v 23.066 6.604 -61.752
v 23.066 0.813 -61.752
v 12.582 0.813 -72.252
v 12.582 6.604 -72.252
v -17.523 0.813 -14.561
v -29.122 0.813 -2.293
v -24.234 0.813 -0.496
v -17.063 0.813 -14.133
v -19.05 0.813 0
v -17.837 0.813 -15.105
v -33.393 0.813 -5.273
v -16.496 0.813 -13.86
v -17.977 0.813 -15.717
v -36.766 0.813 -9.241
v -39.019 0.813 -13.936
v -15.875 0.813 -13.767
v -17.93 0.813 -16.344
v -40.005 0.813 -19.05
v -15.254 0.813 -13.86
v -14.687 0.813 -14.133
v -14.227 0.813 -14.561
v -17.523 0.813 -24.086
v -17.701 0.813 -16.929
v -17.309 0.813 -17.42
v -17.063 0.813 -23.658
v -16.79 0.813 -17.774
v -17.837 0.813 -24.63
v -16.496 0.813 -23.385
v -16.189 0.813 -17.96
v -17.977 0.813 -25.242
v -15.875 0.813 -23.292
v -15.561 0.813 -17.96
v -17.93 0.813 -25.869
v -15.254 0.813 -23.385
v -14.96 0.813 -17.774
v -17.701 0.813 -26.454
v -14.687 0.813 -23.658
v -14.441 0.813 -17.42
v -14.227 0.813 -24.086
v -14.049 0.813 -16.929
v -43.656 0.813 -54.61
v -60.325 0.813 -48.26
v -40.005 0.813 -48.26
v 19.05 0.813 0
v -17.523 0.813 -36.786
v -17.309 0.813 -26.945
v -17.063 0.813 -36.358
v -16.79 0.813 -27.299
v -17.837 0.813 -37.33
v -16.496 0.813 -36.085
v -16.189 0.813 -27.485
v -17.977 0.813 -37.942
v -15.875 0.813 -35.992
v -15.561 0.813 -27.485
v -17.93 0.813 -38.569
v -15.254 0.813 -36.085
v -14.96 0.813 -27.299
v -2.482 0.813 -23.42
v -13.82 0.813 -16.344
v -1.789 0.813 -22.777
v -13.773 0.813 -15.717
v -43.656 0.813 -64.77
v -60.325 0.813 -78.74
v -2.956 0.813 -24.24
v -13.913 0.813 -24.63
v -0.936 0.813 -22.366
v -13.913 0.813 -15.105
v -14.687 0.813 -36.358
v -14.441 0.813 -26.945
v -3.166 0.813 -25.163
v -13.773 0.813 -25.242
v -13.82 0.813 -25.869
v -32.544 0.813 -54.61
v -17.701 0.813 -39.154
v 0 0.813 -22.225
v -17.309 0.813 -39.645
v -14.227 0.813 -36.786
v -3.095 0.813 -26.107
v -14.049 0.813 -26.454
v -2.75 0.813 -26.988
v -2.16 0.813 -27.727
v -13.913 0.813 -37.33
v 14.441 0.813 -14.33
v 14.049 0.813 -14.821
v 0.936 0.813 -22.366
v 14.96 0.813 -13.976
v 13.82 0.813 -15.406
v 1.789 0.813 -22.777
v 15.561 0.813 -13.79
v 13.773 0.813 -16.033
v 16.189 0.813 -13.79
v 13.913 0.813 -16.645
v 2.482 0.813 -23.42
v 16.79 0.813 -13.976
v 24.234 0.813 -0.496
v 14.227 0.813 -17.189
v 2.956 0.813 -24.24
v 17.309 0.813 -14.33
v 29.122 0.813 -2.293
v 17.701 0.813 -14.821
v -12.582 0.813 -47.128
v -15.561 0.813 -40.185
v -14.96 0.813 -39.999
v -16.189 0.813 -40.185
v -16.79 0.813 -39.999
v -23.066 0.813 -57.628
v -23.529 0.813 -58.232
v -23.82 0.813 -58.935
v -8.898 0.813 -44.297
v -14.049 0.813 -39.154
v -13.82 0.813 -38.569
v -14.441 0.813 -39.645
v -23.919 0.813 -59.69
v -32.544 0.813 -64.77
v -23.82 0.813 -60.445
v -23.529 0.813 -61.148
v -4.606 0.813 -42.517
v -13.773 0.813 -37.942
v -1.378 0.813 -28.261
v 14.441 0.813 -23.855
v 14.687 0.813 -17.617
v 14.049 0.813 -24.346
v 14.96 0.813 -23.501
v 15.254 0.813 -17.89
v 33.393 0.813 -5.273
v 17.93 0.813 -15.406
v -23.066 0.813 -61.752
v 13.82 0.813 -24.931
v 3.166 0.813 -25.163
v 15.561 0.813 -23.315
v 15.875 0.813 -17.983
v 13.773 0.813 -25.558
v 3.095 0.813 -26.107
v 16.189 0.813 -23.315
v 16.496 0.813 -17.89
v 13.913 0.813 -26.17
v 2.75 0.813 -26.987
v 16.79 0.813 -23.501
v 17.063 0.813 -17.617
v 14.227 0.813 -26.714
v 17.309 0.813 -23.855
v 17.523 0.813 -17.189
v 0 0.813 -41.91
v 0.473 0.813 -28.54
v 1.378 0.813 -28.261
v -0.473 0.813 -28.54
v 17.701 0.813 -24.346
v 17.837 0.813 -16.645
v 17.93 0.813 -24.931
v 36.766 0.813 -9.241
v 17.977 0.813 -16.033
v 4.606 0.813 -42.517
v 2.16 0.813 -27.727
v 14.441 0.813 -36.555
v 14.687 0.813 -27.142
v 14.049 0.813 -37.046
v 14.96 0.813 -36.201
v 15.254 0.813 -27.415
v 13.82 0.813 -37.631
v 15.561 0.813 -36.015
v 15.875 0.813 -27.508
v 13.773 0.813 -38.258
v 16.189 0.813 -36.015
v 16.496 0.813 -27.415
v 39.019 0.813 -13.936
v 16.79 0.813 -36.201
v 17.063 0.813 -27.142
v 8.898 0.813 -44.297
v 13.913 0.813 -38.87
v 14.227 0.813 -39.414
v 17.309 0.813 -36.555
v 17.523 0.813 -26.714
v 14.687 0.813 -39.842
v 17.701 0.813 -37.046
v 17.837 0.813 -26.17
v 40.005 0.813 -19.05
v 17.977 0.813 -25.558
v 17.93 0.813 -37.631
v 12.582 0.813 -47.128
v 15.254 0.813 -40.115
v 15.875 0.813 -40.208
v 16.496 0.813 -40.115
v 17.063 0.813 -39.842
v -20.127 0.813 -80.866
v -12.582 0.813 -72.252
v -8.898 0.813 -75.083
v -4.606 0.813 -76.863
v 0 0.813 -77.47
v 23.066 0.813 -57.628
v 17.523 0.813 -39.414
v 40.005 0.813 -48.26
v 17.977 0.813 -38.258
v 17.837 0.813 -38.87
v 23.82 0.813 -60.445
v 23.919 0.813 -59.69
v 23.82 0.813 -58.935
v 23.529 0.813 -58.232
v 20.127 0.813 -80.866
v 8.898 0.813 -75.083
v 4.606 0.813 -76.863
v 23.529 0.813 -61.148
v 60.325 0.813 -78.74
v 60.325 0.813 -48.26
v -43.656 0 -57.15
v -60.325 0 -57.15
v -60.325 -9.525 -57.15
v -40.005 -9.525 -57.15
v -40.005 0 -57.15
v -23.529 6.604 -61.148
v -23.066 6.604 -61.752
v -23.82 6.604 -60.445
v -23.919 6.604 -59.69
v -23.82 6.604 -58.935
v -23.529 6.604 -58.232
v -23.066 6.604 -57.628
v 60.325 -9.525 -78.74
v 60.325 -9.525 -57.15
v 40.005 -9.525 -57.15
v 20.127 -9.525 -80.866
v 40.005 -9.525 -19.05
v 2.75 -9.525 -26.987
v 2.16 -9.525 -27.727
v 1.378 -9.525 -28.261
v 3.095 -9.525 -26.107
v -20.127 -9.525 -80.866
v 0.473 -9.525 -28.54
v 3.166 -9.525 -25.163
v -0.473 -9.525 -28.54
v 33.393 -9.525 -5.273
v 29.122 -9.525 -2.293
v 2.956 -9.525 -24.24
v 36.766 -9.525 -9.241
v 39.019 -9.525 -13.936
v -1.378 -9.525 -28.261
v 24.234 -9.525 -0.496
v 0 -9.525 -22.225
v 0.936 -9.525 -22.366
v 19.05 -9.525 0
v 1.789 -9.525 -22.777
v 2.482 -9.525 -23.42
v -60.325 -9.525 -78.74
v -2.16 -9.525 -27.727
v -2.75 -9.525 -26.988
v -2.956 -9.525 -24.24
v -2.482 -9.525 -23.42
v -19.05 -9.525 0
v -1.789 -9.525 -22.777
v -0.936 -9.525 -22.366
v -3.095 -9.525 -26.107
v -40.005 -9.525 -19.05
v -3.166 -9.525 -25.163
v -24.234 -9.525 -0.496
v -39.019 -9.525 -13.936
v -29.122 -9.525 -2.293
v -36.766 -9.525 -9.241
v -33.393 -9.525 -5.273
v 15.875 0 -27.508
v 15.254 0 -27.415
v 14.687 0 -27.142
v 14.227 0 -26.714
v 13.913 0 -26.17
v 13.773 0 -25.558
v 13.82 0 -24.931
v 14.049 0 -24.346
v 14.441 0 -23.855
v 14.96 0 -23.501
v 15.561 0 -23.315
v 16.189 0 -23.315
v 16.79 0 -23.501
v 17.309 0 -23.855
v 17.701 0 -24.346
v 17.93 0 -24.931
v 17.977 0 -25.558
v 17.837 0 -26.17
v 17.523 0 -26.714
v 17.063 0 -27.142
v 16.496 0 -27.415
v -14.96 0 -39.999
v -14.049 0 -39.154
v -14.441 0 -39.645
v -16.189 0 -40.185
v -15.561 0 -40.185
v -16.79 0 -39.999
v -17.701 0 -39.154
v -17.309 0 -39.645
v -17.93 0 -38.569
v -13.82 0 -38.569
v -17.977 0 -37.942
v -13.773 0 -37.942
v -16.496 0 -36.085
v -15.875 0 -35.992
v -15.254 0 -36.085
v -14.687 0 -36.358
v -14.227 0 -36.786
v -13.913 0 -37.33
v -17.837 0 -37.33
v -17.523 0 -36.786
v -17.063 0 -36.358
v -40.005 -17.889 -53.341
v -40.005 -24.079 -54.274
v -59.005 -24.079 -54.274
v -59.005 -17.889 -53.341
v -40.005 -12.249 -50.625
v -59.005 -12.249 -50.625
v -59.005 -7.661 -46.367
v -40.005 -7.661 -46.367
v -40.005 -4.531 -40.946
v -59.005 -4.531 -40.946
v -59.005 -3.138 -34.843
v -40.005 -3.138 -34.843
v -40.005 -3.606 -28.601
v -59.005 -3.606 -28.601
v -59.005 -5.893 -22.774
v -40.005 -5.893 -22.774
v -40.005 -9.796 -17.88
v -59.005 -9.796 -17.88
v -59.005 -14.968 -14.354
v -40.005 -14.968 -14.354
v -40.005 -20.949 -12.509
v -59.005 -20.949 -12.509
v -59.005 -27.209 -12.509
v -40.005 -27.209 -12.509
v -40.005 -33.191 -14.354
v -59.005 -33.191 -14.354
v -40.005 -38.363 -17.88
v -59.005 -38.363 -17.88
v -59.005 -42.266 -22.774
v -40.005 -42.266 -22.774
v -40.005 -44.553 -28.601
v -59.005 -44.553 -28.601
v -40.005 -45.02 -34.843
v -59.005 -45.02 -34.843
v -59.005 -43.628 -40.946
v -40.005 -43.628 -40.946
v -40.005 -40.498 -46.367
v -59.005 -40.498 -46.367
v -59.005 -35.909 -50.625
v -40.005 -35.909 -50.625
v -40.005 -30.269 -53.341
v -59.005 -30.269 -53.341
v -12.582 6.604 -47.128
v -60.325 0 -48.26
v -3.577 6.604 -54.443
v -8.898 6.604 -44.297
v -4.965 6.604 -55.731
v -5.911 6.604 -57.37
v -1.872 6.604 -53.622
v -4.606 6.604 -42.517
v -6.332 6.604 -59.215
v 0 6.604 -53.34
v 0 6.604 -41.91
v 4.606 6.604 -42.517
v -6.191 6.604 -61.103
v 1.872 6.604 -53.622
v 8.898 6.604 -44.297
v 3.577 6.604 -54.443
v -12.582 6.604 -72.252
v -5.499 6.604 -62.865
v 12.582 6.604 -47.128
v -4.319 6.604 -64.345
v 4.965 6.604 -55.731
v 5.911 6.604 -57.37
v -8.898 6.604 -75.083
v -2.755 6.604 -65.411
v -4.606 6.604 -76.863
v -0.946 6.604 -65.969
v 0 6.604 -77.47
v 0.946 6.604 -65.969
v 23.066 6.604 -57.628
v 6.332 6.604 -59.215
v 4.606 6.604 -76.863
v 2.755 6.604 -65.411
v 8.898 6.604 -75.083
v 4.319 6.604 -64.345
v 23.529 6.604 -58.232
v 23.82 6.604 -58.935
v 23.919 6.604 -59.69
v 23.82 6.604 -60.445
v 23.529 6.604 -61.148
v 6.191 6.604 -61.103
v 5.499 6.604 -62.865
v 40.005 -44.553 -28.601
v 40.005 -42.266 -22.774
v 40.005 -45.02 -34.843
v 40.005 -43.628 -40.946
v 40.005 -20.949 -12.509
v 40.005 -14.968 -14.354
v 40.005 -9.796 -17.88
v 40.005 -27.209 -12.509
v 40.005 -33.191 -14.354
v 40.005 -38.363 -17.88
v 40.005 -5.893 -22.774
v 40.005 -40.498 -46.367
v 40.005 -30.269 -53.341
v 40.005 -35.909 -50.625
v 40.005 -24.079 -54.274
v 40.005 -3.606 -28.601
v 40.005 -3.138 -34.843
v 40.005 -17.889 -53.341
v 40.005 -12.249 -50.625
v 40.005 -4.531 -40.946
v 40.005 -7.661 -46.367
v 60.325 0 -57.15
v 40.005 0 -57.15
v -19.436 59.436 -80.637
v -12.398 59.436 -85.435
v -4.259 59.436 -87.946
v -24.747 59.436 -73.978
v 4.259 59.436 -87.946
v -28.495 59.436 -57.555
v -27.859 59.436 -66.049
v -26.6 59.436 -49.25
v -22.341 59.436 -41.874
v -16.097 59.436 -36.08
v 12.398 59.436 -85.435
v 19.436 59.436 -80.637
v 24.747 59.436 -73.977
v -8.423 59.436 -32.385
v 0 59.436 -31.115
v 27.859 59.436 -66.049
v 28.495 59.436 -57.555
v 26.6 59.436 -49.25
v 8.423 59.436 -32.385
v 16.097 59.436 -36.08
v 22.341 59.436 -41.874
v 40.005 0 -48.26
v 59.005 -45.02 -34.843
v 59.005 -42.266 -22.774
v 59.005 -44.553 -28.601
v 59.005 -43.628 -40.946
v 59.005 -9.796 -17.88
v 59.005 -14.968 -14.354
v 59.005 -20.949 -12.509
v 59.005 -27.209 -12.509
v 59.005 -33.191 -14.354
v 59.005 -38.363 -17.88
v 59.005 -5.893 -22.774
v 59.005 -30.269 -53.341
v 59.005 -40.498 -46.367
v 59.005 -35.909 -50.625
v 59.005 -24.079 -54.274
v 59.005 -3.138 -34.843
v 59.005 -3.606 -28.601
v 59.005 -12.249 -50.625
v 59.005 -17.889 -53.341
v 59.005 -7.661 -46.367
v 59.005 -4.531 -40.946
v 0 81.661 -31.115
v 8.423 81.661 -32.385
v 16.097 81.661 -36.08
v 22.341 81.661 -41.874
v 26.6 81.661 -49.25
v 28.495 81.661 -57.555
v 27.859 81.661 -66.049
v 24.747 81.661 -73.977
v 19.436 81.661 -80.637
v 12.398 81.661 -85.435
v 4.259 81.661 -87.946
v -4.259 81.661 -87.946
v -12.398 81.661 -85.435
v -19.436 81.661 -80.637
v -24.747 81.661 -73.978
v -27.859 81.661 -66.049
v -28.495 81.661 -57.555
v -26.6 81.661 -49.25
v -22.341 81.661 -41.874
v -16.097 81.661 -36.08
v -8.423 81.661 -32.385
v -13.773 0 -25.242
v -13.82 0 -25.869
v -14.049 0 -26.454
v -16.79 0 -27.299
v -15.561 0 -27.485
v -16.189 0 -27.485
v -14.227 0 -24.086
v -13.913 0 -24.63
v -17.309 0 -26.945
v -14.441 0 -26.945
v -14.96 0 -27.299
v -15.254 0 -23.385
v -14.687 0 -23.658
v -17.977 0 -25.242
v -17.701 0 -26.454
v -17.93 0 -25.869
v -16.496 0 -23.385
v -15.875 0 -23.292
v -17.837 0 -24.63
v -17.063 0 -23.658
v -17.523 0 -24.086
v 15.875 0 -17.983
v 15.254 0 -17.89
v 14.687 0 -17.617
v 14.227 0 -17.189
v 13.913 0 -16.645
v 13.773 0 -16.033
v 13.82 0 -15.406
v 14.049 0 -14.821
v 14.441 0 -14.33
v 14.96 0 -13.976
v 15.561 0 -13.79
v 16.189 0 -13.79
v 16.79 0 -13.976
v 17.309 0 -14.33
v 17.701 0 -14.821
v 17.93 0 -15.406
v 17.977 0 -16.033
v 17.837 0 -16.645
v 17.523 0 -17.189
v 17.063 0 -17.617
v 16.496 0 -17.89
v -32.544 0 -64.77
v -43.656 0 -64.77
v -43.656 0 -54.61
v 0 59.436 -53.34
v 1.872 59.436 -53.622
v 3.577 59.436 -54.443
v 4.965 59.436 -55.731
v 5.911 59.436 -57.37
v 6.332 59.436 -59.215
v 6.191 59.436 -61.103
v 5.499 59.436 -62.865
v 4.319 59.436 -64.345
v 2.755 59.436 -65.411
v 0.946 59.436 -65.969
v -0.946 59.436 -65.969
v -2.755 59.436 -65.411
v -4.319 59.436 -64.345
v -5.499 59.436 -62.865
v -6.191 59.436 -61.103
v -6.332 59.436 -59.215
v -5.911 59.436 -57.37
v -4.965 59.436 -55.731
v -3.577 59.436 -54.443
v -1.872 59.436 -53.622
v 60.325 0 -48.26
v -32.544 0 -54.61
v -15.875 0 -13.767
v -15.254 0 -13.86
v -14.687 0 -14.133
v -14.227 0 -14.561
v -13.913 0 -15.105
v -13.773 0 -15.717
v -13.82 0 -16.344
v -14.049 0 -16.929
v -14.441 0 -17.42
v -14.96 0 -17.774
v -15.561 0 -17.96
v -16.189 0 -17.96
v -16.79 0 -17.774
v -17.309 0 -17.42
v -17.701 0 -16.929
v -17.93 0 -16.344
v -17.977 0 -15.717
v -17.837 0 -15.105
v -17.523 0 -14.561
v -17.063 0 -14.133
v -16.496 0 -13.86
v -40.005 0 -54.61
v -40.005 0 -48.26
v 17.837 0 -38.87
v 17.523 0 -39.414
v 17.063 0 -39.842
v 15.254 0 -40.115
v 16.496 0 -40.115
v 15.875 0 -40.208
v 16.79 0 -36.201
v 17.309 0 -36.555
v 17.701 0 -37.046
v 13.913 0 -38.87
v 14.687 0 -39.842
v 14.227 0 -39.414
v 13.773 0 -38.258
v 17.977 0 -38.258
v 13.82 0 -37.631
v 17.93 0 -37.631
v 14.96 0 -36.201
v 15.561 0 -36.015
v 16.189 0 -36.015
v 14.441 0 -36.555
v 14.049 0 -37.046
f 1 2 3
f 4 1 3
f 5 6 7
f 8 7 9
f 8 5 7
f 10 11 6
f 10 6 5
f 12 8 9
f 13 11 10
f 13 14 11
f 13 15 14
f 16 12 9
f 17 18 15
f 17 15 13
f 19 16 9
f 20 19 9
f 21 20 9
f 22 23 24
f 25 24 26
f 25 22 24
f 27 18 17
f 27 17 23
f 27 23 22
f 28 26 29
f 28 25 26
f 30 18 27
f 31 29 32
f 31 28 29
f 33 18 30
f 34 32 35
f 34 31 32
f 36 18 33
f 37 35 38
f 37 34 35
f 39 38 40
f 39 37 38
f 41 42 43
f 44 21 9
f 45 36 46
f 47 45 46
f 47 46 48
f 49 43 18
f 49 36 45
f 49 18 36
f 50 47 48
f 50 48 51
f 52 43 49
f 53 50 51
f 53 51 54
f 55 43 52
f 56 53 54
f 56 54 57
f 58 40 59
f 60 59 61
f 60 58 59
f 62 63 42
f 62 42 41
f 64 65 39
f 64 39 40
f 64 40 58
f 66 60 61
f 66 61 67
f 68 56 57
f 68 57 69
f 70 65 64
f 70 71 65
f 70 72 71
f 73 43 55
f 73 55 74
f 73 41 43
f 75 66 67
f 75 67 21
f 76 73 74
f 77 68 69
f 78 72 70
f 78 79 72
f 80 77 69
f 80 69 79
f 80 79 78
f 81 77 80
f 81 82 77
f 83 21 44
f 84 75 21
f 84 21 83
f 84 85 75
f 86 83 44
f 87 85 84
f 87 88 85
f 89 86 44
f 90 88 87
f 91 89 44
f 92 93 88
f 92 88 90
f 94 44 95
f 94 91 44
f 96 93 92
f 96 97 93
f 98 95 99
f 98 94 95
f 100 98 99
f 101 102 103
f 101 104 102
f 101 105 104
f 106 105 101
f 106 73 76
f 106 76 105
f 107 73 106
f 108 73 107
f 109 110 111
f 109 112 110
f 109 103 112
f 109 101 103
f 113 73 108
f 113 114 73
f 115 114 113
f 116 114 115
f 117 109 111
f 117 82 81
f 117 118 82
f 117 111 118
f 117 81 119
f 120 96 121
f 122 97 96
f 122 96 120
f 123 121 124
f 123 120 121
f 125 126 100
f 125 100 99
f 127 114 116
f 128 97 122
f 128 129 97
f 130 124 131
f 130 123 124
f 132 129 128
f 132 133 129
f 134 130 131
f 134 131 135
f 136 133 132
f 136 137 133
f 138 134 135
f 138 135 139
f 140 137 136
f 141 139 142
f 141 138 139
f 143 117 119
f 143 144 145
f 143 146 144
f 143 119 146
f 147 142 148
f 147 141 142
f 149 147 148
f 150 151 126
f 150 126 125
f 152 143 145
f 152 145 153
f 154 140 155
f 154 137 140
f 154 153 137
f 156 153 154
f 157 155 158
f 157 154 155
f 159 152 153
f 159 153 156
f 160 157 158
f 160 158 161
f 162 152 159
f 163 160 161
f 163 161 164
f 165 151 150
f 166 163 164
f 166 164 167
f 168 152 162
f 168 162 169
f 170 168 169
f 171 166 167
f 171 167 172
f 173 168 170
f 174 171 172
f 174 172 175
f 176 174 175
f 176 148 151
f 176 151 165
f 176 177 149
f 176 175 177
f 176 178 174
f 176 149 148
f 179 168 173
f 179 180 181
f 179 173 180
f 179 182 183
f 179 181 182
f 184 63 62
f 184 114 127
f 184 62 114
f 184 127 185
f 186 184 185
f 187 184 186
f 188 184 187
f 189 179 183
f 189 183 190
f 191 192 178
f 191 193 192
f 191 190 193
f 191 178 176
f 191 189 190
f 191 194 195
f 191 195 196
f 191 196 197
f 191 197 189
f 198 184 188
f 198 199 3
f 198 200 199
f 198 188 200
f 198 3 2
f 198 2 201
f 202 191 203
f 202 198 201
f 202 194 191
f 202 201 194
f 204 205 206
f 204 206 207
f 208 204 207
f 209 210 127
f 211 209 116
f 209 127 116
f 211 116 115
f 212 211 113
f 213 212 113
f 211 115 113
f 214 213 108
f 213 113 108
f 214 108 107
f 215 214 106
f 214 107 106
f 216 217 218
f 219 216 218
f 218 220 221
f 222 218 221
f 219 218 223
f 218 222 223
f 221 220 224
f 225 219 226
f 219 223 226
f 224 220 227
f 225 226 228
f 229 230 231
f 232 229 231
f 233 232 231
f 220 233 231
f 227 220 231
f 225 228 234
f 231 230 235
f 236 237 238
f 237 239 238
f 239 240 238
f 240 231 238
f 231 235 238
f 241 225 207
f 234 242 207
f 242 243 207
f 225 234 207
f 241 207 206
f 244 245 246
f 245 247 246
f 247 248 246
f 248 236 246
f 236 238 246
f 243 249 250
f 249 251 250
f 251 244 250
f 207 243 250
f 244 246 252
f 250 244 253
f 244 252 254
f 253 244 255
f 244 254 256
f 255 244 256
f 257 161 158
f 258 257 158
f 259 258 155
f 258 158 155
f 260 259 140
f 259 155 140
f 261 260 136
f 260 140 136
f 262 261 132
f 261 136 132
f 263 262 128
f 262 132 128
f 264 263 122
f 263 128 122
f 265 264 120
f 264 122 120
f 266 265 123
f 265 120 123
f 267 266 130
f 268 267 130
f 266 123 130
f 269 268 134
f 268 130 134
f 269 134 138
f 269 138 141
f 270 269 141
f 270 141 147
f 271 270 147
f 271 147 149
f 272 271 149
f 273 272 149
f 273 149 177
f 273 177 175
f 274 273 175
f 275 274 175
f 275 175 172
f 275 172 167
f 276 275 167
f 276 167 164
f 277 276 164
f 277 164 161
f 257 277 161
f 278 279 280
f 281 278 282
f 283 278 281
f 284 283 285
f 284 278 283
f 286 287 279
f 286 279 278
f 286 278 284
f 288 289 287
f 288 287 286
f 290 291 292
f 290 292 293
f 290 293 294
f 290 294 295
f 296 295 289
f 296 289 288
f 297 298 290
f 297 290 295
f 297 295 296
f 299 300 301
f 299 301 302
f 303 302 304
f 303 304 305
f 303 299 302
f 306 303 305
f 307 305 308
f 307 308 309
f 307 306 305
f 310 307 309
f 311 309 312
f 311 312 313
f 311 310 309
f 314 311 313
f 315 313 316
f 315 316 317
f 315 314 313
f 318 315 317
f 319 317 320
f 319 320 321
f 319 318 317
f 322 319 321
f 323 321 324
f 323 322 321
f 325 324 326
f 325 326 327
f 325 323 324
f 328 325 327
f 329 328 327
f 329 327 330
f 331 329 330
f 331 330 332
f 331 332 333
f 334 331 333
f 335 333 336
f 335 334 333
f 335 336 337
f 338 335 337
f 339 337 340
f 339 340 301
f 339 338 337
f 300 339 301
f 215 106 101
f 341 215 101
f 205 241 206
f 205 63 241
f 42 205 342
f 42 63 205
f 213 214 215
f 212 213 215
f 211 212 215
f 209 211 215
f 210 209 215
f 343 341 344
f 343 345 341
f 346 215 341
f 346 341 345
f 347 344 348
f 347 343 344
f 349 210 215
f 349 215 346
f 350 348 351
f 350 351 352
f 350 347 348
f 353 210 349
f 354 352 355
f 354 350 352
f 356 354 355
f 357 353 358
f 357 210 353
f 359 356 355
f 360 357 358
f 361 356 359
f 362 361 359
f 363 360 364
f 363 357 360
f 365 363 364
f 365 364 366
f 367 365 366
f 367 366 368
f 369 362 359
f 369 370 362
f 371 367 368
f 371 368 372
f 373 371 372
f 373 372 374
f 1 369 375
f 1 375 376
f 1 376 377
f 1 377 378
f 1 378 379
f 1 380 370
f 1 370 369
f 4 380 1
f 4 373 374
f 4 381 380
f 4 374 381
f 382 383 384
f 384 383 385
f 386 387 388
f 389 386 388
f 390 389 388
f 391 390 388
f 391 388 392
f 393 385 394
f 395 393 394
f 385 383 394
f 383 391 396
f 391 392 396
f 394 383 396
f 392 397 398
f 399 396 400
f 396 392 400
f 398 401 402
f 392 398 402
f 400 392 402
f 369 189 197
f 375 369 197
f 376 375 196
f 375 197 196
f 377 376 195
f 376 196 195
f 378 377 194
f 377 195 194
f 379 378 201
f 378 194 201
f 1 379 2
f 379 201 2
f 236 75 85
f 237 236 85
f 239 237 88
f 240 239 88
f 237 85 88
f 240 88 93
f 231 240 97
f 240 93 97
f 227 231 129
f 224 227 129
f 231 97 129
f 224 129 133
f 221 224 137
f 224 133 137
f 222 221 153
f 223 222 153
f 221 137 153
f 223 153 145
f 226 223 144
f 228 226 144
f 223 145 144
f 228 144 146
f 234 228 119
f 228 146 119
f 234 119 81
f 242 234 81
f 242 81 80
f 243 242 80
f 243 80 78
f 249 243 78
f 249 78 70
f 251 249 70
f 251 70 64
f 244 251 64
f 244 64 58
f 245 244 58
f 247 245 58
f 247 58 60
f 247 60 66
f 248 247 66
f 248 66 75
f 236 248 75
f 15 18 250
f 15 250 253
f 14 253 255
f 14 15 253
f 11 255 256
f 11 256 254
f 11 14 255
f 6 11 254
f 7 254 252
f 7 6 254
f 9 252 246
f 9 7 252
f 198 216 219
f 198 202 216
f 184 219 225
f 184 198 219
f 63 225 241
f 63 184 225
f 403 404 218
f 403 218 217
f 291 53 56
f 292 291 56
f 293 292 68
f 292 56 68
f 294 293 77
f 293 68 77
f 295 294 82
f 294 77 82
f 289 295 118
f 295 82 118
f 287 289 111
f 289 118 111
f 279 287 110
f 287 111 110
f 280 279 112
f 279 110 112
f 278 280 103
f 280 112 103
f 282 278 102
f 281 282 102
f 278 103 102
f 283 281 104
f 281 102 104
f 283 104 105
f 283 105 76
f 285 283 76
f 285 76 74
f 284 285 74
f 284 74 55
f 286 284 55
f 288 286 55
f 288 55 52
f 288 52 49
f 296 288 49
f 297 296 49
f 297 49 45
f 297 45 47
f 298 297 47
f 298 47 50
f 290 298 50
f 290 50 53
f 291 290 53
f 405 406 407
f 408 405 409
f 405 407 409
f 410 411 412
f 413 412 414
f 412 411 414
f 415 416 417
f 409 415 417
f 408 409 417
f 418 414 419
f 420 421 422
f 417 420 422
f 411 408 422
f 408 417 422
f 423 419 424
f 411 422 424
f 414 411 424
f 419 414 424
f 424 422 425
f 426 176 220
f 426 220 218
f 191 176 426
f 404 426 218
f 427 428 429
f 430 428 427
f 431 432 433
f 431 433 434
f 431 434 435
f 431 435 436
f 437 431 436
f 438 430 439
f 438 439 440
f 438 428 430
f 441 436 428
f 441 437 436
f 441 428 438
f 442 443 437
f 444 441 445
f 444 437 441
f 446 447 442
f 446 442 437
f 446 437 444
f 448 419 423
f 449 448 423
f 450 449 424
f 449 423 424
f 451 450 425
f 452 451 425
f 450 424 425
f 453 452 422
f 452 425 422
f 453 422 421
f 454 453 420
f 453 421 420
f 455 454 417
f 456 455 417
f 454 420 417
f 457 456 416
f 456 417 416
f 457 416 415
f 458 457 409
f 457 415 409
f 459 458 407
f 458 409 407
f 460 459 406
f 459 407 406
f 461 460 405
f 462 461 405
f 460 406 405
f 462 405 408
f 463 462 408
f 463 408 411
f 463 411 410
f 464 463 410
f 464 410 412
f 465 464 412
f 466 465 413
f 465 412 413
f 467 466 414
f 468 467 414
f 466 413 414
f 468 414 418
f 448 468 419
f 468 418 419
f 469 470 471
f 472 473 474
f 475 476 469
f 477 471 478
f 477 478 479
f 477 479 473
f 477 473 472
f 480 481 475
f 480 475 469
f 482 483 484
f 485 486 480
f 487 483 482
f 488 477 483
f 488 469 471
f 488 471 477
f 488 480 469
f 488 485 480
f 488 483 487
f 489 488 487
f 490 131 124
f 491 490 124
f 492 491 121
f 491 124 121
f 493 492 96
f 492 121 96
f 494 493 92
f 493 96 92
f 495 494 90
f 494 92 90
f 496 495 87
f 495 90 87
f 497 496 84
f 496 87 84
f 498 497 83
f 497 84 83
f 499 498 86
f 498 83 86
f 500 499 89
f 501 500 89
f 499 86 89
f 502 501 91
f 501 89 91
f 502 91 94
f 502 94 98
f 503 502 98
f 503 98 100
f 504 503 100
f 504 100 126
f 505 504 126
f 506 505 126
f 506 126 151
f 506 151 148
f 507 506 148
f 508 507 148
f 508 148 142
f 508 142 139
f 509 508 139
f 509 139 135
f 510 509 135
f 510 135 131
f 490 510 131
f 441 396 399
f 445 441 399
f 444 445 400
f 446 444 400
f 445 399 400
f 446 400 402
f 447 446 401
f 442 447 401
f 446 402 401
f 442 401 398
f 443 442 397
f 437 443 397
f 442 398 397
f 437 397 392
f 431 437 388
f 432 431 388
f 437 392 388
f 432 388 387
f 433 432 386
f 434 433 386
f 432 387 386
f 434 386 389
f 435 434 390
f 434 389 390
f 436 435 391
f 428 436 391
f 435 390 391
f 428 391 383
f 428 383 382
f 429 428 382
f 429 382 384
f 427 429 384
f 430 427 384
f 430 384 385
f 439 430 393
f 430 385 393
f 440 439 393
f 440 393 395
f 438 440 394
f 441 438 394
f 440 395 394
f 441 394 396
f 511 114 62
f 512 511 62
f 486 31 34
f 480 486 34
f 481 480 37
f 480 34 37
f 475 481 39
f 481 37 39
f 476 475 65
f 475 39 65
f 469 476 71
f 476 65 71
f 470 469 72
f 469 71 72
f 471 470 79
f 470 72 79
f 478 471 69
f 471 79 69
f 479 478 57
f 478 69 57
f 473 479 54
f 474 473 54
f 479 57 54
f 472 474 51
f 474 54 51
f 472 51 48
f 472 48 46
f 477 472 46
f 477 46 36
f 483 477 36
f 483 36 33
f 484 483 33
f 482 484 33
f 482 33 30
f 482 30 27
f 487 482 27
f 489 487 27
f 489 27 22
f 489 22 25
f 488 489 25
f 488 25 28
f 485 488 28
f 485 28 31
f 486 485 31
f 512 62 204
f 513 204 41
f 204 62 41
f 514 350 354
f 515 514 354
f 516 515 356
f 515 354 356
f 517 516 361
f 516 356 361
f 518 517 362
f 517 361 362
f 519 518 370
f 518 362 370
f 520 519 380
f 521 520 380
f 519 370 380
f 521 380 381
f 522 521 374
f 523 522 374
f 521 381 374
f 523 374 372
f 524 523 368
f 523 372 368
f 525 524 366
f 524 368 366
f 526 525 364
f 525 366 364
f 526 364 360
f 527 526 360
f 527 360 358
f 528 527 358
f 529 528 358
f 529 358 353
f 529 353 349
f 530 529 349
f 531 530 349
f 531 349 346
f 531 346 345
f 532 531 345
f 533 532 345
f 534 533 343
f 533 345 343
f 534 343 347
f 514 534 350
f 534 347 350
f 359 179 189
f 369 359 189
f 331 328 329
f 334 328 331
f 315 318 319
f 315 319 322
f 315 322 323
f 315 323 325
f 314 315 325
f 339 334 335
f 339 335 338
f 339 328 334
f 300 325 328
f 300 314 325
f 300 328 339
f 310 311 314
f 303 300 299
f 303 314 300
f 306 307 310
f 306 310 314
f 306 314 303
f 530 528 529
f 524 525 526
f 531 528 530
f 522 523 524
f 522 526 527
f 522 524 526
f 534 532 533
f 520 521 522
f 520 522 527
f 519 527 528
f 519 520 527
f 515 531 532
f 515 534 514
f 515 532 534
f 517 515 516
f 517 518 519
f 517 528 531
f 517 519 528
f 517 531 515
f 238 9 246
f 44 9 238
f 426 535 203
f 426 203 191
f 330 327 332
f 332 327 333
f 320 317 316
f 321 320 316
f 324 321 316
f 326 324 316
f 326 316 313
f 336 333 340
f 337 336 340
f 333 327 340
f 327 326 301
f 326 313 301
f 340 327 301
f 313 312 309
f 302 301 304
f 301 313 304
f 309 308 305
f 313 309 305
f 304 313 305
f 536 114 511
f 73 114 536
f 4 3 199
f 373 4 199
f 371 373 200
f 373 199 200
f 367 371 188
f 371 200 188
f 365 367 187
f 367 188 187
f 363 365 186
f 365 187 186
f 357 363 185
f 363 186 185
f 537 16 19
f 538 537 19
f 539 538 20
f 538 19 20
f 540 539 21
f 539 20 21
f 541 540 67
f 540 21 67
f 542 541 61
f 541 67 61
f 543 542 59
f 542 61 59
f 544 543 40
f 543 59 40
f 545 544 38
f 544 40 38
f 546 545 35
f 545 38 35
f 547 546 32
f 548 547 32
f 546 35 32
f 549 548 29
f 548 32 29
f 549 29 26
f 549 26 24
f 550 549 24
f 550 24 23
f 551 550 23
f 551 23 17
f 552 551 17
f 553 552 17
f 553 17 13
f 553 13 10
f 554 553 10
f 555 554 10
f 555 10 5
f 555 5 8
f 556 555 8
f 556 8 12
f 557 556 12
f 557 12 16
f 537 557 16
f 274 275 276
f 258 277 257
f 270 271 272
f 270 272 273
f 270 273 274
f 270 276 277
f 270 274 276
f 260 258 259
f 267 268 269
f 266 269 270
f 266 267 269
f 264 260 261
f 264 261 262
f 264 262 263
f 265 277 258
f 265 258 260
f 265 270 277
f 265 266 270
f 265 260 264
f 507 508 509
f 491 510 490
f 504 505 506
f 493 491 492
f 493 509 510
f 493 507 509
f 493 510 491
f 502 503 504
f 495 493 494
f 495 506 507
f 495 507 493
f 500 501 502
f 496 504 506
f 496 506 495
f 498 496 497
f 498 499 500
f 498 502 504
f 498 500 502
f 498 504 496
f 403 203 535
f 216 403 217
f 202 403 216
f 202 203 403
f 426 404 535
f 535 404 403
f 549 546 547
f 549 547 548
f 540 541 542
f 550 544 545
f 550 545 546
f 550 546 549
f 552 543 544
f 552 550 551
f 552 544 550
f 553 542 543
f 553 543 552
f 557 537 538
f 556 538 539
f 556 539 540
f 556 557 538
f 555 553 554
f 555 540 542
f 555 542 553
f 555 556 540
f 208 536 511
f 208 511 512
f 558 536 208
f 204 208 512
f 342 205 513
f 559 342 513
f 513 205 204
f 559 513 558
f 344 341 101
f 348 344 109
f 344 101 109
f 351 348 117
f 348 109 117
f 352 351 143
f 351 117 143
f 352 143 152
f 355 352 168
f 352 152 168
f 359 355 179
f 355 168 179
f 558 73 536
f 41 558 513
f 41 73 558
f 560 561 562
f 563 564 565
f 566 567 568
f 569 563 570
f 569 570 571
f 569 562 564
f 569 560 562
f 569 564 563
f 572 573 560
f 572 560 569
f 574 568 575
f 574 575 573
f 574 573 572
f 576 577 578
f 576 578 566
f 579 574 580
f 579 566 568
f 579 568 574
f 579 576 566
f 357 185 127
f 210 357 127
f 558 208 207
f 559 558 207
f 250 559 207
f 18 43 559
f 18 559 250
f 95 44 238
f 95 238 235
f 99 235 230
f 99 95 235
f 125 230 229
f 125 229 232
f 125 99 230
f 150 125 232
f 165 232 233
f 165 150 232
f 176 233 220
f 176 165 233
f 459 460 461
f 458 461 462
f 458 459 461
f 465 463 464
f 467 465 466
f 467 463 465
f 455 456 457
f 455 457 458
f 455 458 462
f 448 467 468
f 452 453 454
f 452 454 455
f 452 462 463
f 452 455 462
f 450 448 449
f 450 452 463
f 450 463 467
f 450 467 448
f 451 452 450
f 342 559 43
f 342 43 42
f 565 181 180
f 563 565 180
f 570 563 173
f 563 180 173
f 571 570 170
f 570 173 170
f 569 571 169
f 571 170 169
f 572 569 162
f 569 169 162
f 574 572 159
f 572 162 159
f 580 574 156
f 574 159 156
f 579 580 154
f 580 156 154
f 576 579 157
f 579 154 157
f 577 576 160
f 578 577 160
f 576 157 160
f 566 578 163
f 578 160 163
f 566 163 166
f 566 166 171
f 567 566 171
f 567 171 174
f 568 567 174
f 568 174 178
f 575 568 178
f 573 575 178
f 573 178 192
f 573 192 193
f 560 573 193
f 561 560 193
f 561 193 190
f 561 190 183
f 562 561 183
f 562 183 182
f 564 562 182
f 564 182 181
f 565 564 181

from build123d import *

# Parameters (mm, degrees)
EXTRUDE1_DEPTH     = 0.8128
SKETCH3_R          = 17.78
SKETCH3_R_2        = 1.651
EXTRUDE2_DEPTH     = 1.8128
SKETCH4_W          = 11.1125
SKETCH4_H          = 10.16
CUT_EXTRUDE1_DEPTH = 1.8128
SKETCH5_R          = 2.1082
EXTRUDE3_DEPTH     = 1.8128
EXTRUDE5_DEPTH     = 0.8128
EXTRUDE6_DEPTH     = 9.525
SKETCH8_R          = 2.918849546
SKETCH8_R_2        = 17.78
EXTRUDE7_DEPTH     = 6.604
SKETCH9_R          = 21
EXTRUDE8_DEPTH     = 19
SKETCH10_R         = 6.35
EXTRUDE9_DEPTH     = 52.832
SKETCH11_R         = 28.575
EXTRUDE10_DEPTH    = 22.225
SKETCH12_R         = 3.175
EXTRUDE11_DEPTH    = 46.892


with BuildPart() as part:
    # Sketch1 → Extrude1 (new body)
    with BuildSketch(Plane(origin=(0, 0, 0), x_dir=(1, 0, 0), z_dir=(0, 1, 0))):
        with BuildLine():
            Line((19.05, 0), (-19.05, 0))
            ThreePointArc((-19.05, 0), (-33.392740352, 5.273235613), (-40.005, 19.05))
            Line((-40.005, 19.05), (-40.005, 48.26))
            Line((-40.005, 48.26), (-60.325, 48.26))
            Line((-60.325, 48.26), (-60.325, 78.74))
            Line((-60.325, 78.74), (60.325, 78.74))
            Line((60.325, 78.74), (60.325, 48.26))
            Line((60.325, 48.26), (40.005, 48.26))
            Line((40.005, 48.26), (40.005, 19.05))
            ThreePointArc((40.005, 19.05), (33.392740352, 5.273235613), (19.05, 0))
        make_face()
    extrude(amount=EXTRUDE1_DEPTH)

    # Sketch3 → Extrude2 (cut, through all)
    with BuildSketch(Plane(origin=(0, 0.8128, 0), x_dir=(-1, 0, 0), z_dir=(0, 1, 0))):
        with Locations(Location((0, -59.69, 0), (0, 0, 90))):  # turned: the seam where the file's is
            Circle(SKETCH3_R)
        with Locations(Location((21, -59.69, 0), (0, 0, 90))):  # turned: the seam where the file's is
            Circle(SKETCH3_R_2)
        with Locations(Location((-21, -59.69, 0), (0, 0, 270))):  # turned: the seam where the file's is
            Circle(SKETCH3_R_2)
    extrude(amount=-EXTRUDE2_DEPTH, mode=Mode.SUBTRACT)

    # Sketch4 → Cut-Extrude1 (cut, through all)
    with BuildSketch(Plane(origin=(0, 0.8128, 0), x_dir=(-1, 0, 0), z_dir=(0, 1, 0))):
        with Locations((38.1, -59.69)):
            Rectangle(SKETCH4_W, SKETCH4_H)
    extrude(amount=-CUT_EXTRUDE1_DEPTH, mode=Mode.SUBTRACT)

    # Sketch5 → Extrude3 (cut, through all)
    with BuildSketch(Plane(origin=(0, 0.8128, 0), x_dir=(-1, 0, 0), z_dir=(0, 1, 0))):
        with Locations(Location((15.875, -38.1, 0), (0, 0, 90))):  # turned: the seam where the file's is
            Circle(SKETCH5_R)
        with Locations(Location((15.875, -25.4, 0), (0, 0, 90))):  # turned: the seam where the file's is
            Circle(SKETCH5_R)
        with Locations(Location((15.875, -15.875, 0), (0, 0, 90))):  # turned: the seam where the file's is
            Circle(SKETCH5_R)
        with Locations(Location((-15.875, -15.875, 0), (0, 0, 270))):  # turned: the seam where the file's is
            Circle(SKETCH5_R)
        with Locations(Location((-15.875, -25.4, 0), (0, 0, 270))):  # turned: the seam where the file's is
            Circle(SKETCH5_R)
        with Locations(Location((-15.875, -38.1, 0), (0, 0, 270))):  # turned: the seam where the file's is
            Circle(SKETCH5_R)
    extrude(amount=-EXTRUDE3_DEPTH, mode=Mode.SUBTRACT)

    # Sketch6 → Extrude5 (add, through all)
    with BuildSketch(Plane(origin=(0, 0.8128, 0), x_dir=(1, 0, 0), z_dir=(0, 1, 0))):
        with BuildLine():
            Line((-60.325, 78.74), (60.325, 78.74))
            ThreePointArc((60.325, 78.74), (0, 81.131617756), (-60.325, 78.74))
        make_face()
    extrude(amount=-EXTRUDE5_DEPTH)

    # Sketch7 → Extrude6 (add)
    with BuildSketch(Plane.XZ):
        with BuildLine():
            Line((-60.325, -78.74), (-60.325, -57.15))
            Line((-60.325, -57.15), (-40.005, -57.15))
            Line((-40.005, -57.15), (-40.005, -19.05))
            ThreePointArc((-40.005, -19.05), (-33.392740352, -5.273235613), (-19.05, 0))
            Line((-19.05, 0), (19.05, 0))
            ThreePointArc((19.05, 0), (33.392740352, -5.273235613), (40.005, -19.05))
            Line((40.005, -19.05), (40.005, -57.15))
            Line((40.005, -57.15), (60.325, -57.15))
            Line((60.325, -57.15), (60.325, -78.74))
            ThreePointArc((60.325, -78.74), (0, -81.131617756), (-60.325, -78.74))
        make_face()
    extrude(amount=EXTRUDE6_DEPTH)

    # Sketch8 → Extrude7 (add)
    with BuildSketch(Plane(origin=(0, 0, 0), x_dir=(1, 0, 0), z_dir=(0, 1, 0))):
        with BuildLine():
            Line((-12.582440718, 72.252268329), (-23.065593441, 61.752281845))
            ThreePointArc((-23.065593441, 61.752281845), (-19.884086429, 62.387113192), (-18.081150454, 59.69))
            ThreePointArc((-18.081150454, 59.69), (-19.884086429, 56.992886808), (-23.065593441, 57.627718155))
            Line((-23.065593441, 57.627718155), (-12.582440718, 47.127731671))
            ThreePointArc((-12.582440718, 47.127731671), (-17.78, 59.69), (-12.582440718, 72.252268329))
        make_face()
        with Locations((-21, 59.69)):
            Circle(SKETCH8_R)
        with Locations((0, 59.69)):
            Circle(SKETCH8_R_2)
        with BuildLine():
            Line((23.065593441, 61.752281845), (12.582440718, 72.252268329))
            ThreePointArc((12.582440718, 72.252268329), (16.429306071, 66.487521755), (17.78, 59.69))
            ThreePointArc((17.78, 59.69), (16.429306071, 52.892478245), (12.582440718, 47.127731671))
            Line((12.582440718, 47.127731671), (23.065593441, 57.627718155))
            ThreePointArc((23.065593441, 57.627718155), (18.081150454, 59.69), (23.065593441, 61.752281845))
        make_face()
        with Locations((21, 59.69)):
            Circle(SKETCH8_R)
    extrude(amount=EXTRUDE7_DEPTH)

    # Sketch10 → Extrude9 (add)
    with BuildSketch(Plane(origin=(0, 6.604, 0), x_dir=(-1, 0, 0), z_dir=(0, 1, 0))):
        with Locations(Location((0, -59.69, 0), (0, 0, 90))):  # turned: the seam where the file's is
            Circle(SKETCH10_R)
    extrude(amount=EXTRUDE9_DEPTH)

    # Sketch12 → Extrude11 (cut, through all)
    with BuildSketch(Plane(origin=(0, 0.8128, 0), x_dir=(-1, 0, 0), z_dir=(0, 1, 0))):
        with Locations(Location((0, -25.4, 0), (0, 0, 90))):  # turned: the seam where the file's is
            Circle(SKETCH12_R)
    extrude(amount=-EXTRUDE11_DEPTH, mode=Mode.SUBTRACT)


with BuildPart() as body_2:
    # Sketch9 → Extrude8 (new body)
    with BuildSketch(Plane(origin=(40.005, 0, 0), x_dir=(0, 0, -1), z_dir=(1, 0, 0))):
        with Locations((33.274, -24.0792)):
            Circle(SKETCH9_R)
    extrude(amount=EXTRUDE8_DEPTH)


with BuildPart() as body_3:
    # Mirror3: mirrored copy
    add(body_2.part.mirror(Plane(origin=(0, 0, 0), x_dir=(0, 0, 1), z_dir=(1, 0, 0))))


with BuildPart() as body_4:
    # Sketch11 → Extrude10 (new body)
    with BuildSketch(Plane(origin=(0, 59.436, 0), x_dir=(-1, 0, 0), z_dir=(0, 1, 0))):
        with Locations(Location((0, -59.69, 0), (0, 0, 90))):  # turned: the seam where the file's is
            Circle(SKETCH11_R)
    extrude(amount=EXTRUDE10_DEPTH)


solid = Compound([part.part, body_2.part, body_3.part, body_4.part])
